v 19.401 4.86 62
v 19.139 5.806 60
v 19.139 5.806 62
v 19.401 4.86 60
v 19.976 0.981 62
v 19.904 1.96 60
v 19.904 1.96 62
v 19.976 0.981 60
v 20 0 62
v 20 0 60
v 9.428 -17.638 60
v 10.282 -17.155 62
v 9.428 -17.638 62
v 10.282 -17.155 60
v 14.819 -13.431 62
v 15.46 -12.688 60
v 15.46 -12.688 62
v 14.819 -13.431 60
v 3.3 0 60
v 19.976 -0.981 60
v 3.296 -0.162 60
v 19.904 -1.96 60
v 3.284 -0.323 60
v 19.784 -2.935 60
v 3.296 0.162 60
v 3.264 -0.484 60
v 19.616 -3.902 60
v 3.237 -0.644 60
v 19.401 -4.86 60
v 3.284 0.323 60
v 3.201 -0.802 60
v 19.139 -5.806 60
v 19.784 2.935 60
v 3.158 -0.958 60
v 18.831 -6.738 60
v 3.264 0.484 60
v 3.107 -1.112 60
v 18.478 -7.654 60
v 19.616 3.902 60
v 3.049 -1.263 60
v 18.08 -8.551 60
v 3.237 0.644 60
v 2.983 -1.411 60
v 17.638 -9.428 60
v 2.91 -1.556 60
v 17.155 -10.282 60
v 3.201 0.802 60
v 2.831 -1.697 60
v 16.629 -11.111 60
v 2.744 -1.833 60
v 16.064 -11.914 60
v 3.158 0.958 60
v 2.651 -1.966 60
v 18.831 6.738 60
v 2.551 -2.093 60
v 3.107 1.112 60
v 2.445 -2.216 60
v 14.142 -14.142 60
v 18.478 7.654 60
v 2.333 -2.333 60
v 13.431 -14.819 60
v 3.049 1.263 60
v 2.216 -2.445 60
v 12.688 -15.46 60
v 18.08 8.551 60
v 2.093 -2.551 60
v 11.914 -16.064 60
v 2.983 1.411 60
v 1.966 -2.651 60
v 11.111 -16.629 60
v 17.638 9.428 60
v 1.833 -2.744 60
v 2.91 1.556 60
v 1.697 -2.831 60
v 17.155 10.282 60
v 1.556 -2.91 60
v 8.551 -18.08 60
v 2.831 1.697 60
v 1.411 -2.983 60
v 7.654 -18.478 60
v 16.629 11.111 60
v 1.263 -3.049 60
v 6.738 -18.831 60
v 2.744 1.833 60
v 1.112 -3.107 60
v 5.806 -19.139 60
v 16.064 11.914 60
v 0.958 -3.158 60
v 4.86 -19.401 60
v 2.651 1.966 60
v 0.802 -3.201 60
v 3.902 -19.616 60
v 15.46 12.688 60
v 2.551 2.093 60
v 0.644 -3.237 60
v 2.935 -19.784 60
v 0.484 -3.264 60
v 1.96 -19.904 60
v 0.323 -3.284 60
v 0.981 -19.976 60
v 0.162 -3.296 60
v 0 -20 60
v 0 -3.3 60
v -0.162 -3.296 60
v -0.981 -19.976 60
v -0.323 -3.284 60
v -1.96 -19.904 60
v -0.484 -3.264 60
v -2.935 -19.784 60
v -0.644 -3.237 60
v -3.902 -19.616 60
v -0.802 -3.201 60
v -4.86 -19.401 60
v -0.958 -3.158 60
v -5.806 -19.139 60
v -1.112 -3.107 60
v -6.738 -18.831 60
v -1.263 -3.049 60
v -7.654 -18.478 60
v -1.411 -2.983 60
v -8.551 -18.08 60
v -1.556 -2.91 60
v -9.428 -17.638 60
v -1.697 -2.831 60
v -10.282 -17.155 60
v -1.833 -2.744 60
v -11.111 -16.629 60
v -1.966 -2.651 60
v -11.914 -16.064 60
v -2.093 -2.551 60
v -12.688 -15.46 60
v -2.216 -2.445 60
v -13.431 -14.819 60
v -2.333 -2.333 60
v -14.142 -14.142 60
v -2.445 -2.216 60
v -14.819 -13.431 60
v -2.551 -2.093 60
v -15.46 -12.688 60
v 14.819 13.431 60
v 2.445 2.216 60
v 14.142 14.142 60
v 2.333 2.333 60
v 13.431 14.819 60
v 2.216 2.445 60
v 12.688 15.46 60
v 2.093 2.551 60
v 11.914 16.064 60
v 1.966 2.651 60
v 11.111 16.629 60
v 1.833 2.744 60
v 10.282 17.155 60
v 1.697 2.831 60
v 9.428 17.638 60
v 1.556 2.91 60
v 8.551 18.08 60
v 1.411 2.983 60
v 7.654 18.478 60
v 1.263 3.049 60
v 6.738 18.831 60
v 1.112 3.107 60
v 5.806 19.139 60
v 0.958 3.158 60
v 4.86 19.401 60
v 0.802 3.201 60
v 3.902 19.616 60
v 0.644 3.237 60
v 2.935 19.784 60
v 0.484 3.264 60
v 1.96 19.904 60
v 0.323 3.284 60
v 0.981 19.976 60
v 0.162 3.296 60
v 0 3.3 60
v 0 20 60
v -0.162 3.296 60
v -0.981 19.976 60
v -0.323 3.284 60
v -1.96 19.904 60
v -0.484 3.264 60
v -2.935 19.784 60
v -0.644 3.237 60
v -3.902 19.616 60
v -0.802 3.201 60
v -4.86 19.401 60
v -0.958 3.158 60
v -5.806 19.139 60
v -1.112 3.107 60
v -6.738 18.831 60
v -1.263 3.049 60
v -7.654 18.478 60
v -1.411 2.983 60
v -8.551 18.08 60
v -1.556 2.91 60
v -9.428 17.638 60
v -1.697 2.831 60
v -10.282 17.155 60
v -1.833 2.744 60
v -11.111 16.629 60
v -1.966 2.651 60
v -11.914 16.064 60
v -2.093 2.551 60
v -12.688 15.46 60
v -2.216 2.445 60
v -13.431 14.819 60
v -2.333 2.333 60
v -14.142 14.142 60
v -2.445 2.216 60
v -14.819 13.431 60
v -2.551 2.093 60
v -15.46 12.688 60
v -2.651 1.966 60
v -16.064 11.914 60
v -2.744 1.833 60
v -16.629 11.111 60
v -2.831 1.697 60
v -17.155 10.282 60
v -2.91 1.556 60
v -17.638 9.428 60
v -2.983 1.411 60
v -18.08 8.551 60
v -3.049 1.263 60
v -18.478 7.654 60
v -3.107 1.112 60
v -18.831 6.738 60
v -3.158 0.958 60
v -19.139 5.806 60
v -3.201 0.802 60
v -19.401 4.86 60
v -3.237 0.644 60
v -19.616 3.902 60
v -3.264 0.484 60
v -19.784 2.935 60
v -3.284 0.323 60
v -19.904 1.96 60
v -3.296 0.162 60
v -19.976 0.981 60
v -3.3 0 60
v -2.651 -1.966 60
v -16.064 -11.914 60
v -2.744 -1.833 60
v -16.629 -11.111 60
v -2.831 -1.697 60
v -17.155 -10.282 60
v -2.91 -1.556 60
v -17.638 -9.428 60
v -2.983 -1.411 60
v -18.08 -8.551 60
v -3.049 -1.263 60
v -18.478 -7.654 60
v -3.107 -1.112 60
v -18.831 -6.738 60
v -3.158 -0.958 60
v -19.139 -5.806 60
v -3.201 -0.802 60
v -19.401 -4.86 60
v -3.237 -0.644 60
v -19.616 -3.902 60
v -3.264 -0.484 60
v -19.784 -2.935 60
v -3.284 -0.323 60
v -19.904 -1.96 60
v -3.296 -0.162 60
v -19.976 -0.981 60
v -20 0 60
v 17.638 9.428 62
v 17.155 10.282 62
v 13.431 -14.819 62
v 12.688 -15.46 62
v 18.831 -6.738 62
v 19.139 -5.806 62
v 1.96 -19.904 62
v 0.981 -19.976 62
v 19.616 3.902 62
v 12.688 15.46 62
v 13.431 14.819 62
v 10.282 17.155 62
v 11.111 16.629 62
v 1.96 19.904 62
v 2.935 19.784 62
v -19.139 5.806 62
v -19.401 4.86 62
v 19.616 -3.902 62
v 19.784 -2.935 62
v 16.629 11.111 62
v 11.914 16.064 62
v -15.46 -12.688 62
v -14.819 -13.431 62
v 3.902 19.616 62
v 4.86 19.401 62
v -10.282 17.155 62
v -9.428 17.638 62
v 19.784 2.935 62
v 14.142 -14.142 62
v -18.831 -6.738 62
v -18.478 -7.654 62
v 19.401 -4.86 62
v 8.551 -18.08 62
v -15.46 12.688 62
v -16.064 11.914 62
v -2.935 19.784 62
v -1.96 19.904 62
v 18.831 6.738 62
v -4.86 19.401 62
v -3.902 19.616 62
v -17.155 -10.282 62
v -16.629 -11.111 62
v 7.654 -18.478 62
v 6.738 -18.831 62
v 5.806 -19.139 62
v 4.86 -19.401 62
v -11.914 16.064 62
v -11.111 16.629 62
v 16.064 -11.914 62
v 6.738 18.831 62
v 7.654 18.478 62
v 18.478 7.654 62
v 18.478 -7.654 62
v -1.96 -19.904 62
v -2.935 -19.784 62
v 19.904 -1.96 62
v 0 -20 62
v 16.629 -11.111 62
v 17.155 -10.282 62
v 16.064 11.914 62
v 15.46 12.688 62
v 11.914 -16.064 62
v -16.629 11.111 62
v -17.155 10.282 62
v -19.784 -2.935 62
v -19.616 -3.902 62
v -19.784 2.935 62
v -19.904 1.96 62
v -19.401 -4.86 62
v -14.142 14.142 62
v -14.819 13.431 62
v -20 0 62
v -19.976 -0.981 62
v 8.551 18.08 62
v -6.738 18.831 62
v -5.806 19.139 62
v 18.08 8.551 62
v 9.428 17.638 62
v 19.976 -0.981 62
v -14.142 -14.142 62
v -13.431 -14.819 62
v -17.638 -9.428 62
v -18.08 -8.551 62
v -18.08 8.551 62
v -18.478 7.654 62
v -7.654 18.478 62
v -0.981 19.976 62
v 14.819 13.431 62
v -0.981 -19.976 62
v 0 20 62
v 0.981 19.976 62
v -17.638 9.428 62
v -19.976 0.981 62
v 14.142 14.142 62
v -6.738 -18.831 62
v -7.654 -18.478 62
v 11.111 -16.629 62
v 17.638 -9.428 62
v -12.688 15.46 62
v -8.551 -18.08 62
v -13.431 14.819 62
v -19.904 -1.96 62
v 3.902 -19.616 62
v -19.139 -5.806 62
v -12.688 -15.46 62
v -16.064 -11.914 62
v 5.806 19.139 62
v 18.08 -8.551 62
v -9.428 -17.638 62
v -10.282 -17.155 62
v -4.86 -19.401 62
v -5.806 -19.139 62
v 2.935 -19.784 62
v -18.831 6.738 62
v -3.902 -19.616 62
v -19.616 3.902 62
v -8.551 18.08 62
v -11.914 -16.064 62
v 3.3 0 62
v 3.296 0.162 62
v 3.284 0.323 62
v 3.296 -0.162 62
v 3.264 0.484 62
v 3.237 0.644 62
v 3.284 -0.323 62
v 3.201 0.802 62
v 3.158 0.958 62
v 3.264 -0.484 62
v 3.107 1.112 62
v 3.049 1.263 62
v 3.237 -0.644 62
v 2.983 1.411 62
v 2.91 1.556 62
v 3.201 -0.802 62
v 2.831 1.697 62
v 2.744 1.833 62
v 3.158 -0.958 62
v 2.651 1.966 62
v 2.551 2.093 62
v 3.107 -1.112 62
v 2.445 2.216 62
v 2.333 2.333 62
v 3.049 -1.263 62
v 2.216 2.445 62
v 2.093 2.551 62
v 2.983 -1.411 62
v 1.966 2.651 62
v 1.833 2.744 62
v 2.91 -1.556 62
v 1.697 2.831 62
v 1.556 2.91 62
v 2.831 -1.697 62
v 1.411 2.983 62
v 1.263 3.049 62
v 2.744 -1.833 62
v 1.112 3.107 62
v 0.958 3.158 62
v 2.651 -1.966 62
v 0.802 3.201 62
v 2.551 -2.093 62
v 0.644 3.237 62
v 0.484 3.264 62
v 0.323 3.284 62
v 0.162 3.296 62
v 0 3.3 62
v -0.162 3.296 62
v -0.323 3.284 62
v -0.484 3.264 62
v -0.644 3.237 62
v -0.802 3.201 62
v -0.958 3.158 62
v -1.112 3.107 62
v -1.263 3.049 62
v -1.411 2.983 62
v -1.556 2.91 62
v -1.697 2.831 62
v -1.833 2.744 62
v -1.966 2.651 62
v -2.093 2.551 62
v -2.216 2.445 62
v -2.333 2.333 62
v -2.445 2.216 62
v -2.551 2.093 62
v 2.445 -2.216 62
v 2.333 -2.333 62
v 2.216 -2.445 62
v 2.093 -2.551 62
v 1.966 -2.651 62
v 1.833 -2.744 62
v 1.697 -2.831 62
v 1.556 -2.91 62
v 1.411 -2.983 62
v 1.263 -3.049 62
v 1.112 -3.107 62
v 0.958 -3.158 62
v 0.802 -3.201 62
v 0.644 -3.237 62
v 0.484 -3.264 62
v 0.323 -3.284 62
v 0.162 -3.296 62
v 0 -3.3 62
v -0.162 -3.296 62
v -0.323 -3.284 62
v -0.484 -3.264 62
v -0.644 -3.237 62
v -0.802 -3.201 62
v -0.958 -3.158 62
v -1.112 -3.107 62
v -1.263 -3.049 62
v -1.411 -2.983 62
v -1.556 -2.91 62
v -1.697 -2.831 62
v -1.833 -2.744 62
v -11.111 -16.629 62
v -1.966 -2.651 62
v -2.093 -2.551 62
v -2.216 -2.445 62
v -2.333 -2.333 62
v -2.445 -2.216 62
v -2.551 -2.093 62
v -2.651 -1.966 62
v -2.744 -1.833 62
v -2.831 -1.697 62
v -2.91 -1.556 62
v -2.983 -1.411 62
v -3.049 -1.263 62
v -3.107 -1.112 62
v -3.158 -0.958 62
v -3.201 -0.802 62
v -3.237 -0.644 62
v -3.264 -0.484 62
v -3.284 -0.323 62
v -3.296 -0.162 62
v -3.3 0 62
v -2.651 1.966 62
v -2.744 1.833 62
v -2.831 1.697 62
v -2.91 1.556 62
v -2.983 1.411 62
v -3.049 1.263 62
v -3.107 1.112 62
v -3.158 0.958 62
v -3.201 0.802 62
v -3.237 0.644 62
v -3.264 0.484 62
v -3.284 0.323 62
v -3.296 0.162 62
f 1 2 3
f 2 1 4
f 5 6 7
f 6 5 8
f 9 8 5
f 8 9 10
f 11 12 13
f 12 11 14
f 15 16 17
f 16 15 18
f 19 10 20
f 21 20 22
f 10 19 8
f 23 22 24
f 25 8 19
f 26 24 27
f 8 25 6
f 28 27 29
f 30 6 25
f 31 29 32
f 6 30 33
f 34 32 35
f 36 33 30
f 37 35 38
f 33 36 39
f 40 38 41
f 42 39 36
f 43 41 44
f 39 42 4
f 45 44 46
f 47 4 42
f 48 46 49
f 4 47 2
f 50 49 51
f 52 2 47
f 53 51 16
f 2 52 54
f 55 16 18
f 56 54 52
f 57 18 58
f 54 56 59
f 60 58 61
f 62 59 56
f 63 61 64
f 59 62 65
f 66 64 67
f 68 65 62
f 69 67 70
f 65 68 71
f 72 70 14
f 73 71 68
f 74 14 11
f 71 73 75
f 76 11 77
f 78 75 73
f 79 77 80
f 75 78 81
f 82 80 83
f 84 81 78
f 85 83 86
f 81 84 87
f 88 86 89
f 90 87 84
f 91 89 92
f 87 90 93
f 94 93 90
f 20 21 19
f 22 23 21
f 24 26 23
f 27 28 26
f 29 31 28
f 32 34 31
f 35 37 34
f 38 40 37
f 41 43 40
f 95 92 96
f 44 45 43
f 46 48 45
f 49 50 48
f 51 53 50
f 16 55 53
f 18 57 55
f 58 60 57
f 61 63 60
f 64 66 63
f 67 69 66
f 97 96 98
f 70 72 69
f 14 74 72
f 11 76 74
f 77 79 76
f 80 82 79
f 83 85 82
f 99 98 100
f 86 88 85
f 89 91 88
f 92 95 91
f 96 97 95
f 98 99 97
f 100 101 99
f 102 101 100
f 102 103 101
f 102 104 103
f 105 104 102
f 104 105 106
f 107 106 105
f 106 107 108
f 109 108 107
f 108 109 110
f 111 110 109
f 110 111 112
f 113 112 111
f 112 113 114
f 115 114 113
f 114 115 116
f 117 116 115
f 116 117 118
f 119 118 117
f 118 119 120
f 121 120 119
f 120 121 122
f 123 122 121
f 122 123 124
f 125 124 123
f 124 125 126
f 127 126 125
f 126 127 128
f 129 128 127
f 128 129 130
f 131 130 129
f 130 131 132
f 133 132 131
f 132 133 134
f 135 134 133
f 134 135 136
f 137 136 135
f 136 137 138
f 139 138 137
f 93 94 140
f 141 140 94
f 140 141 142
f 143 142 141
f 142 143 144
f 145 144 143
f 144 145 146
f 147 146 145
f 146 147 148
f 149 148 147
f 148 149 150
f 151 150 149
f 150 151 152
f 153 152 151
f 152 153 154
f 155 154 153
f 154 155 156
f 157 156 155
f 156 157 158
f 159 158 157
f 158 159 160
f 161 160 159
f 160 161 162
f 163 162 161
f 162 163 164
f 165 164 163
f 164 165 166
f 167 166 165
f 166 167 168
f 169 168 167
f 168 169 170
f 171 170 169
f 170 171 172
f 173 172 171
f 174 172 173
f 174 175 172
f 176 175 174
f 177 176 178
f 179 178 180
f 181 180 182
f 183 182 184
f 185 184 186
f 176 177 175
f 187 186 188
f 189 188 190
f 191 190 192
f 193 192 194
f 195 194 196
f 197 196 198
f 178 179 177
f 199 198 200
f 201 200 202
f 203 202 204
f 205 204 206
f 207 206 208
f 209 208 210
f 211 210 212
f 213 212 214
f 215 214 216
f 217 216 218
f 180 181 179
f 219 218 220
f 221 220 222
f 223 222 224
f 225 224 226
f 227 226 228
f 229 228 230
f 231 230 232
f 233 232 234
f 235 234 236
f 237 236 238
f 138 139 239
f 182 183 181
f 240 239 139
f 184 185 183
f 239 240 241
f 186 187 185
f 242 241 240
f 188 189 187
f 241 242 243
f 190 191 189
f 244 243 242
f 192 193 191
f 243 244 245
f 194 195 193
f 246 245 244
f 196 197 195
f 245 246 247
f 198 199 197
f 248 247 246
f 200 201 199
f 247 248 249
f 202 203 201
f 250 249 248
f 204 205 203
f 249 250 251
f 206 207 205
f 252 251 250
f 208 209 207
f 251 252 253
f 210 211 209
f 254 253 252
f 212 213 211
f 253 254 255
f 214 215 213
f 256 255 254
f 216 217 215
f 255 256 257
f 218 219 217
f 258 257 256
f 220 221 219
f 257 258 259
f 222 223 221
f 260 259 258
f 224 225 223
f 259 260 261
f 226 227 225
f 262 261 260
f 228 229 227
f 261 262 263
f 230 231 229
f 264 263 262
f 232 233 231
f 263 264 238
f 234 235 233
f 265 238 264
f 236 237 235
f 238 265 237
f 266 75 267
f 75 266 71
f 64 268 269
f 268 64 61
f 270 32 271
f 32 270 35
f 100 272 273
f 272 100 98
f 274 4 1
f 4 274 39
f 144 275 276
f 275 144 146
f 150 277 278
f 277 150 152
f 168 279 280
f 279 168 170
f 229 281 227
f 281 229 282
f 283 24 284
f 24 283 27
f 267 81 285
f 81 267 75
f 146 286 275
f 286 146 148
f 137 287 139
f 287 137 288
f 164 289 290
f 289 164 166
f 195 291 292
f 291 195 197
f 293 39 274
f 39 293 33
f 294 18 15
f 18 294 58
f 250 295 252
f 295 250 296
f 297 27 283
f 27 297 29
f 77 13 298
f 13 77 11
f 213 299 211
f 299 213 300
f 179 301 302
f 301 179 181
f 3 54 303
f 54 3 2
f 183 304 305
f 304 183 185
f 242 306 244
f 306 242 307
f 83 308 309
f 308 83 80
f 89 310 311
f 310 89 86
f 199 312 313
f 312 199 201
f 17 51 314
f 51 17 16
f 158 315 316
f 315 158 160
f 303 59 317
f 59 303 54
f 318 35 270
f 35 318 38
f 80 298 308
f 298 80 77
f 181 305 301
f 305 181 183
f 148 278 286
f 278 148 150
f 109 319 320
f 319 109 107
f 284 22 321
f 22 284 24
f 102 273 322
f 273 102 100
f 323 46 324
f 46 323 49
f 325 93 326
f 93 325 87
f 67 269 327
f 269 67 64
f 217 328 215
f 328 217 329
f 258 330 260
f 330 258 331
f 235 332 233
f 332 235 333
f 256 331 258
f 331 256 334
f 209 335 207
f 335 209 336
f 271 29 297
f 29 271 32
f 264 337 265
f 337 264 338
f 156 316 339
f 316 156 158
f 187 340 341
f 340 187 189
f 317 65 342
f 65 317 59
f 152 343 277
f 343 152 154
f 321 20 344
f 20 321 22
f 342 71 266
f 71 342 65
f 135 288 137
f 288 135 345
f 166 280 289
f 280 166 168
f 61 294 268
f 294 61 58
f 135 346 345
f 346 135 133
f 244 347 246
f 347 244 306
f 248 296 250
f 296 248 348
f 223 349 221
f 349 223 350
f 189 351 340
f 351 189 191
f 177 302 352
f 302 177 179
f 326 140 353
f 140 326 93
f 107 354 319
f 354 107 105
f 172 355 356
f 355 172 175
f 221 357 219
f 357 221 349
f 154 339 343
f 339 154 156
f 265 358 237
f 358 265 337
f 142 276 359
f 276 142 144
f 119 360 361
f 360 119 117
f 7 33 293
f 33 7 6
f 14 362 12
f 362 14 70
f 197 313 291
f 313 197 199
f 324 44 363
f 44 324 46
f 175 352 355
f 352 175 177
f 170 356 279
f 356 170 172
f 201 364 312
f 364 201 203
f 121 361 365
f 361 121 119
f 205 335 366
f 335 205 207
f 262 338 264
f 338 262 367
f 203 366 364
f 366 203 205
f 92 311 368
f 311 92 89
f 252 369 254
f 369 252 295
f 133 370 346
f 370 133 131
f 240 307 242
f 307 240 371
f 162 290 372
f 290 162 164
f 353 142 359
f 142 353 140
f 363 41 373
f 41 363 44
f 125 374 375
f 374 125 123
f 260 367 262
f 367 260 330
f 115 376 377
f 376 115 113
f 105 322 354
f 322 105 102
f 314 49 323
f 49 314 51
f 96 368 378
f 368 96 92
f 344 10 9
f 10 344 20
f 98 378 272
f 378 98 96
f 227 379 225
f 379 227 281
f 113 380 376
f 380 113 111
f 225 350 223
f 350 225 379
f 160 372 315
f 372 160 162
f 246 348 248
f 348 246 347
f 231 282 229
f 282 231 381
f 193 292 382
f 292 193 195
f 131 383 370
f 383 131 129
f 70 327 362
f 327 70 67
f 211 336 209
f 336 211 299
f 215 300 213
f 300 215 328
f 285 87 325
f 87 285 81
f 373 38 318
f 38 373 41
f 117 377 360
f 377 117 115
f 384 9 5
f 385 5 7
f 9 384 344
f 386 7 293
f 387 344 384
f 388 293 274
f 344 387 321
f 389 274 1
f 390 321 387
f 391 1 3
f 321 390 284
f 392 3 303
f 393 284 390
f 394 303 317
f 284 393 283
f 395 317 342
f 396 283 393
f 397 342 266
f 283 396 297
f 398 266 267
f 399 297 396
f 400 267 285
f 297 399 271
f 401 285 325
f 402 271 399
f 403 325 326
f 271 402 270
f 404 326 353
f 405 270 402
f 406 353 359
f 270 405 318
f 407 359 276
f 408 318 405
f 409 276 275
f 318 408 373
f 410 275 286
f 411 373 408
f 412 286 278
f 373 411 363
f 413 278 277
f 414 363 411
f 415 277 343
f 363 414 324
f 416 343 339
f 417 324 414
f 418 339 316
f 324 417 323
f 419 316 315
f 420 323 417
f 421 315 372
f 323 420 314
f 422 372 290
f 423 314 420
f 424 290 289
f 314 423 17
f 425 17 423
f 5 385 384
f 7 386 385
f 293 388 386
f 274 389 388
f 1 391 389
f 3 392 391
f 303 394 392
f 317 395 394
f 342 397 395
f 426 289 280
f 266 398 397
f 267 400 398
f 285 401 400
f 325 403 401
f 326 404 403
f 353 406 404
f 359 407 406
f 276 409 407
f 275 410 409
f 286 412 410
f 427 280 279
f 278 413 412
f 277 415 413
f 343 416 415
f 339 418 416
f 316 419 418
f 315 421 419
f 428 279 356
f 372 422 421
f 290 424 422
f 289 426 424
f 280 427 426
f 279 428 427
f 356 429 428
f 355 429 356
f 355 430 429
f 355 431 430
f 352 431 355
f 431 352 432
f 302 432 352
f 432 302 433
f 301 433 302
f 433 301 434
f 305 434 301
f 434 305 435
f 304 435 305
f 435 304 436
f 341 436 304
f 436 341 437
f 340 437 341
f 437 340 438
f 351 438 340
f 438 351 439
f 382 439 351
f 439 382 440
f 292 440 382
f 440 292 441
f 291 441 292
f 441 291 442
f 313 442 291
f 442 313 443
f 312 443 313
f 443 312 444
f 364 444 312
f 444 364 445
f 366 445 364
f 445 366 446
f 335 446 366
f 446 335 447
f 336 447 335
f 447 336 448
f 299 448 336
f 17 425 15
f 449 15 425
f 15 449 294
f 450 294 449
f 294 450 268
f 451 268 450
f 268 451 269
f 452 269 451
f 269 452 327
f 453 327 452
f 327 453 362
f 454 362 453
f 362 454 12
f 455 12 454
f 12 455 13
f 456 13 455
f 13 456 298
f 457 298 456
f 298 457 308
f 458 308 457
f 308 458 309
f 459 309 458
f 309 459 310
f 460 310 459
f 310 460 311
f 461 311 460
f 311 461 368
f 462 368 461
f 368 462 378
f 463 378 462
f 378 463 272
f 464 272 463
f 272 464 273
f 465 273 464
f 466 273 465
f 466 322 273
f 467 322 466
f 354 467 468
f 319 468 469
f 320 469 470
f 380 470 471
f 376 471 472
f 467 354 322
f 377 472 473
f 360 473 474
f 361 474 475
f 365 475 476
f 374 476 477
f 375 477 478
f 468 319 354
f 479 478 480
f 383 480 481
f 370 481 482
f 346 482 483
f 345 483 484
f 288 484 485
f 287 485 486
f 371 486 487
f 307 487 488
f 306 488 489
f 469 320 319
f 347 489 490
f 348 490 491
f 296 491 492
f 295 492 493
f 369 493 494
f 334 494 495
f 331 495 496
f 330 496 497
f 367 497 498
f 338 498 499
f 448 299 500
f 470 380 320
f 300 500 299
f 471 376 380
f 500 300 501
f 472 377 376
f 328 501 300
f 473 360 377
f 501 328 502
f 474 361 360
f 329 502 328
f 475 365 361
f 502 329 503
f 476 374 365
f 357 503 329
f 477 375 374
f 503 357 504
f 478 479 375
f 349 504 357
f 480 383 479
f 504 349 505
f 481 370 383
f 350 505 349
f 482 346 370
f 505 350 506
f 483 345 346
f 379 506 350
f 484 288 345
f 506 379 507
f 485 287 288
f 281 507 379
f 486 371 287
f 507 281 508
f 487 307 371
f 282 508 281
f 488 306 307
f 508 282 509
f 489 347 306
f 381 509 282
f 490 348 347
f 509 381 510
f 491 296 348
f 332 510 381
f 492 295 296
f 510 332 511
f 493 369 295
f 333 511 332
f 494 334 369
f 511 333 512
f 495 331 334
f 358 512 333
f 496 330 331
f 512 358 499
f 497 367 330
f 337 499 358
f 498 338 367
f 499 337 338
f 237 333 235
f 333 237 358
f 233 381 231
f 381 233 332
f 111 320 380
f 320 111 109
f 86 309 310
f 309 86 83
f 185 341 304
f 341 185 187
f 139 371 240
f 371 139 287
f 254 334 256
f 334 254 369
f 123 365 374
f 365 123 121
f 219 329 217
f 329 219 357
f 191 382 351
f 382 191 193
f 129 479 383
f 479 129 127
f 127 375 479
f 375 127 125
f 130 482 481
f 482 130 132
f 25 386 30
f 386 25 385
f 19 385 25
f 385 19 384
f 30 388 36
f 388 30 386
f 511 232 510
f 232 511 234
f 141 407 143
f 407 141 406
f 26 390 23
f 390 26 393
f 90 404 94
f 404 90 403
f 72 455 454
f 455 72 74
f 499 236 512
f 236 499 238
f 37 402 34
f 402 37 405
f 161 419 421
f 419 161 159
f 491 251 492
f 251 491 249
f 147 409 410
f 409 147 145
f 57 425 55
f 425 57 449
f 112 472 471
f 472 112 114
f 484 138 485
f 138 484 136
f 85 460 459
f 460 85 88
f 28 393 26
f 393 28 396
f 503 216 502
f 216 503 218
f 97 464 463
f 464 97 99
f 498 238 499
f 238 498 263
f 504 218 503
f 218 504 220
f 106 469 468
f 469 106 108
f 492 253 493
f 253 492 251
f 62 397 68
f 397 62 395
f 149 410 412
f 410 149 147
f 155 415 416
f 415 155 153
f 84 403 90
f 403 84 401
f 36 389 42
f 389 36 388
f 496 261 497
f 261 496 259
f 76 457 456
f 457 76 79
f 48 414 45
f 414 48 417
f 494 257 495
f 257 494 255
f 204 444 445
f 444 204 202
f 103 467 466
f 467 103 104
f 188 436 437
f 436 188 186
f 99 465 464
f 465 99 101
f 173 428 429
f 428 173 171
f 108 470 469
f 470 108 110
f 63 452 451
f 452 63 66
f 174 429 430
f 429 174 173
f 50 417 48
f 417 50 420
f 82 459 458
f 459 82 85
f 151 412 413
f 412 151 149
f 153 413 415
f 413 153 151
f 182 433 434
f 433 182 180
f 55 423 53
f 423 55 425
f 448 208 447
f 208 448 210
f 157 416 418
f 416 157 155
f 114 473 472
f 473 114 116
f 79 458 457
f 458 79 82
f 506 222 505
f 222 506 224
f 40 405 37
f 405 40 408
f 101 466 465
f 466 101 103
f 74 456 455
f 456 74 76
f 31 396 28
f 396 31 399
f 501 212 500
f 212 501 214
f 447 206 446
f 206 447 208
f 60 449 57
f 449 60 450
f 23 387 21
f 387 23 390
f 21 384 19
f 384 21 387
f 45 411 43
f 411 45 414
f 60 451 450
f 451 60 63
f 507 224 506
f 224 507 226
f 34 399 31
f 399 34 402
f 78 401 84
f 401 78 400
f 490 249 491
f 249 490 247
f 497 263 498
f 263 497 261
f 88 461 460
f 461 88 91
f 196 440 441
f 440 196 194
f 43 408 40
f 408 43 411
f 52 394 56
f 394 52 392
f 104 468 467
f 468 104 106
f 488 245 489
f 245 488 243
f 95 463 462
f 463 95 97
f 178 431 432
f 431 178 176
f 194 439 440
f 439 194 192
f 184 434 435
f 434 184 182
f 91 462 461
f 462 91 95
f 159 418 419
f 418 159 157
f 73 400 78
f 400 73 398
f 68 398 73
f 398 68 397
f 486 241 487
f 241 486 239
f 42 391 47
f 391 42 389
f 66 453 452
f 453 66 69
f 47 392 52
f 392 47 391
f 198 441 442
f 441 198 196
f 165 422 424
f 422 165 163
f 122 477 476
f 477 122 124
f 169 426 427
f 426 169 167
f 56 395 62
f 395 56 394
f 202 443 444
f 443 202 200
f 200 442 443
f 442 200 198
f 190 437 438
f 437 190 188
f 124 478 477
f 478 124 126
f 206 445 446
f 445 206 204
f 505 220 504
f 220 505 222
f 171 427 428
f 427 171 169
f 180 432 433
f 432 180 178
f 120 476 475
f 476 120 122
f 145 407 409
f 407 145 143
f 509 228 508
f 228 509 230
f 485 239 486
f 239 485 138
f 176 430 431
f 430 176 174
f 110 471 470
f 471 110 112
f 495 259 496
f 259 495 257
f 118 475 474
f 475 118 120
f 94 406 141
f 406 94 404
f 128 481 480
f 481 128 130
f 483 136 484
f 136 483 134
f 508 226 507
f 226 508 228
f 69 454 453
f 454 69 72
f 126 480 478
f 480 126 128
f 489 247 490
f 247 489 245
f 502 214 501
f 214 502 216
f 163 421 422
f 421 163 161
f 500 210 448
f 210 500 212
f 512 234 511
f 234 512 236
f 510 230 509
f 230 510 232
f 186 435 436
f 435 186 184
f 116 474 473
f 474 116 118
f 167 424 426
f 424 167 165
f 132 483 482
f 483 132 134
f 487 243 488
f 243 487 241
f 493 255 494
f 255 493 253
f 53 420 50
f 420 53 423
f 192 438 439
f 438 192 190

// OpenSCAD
// file: common_params.scad
cylinder_radius = 20.000000;
cylinder_height = 60.000000;
wall_thickness = 2.000000;

cap_thickness = 2.000000;

rod_radius = 2.000000;
rod_height = 50.000000;

ring_outer_radius = 8.000000;
ring_inner_radius = 4.000000;
ring_thickness = 3.000000;
ring_z = 40.000000;

$fn = 128;
// main file
include <common_params.scad>;

hole_radius = 3.300000;

translate([0, 0, cylinder_height])
difference() {
    cylinder(h = cap_thickness, r = cylinder_radius);
    translate([0, 0, -0.1])
        cylinder(h = cap_thickness + 0.2, r = hole_radius);
}
